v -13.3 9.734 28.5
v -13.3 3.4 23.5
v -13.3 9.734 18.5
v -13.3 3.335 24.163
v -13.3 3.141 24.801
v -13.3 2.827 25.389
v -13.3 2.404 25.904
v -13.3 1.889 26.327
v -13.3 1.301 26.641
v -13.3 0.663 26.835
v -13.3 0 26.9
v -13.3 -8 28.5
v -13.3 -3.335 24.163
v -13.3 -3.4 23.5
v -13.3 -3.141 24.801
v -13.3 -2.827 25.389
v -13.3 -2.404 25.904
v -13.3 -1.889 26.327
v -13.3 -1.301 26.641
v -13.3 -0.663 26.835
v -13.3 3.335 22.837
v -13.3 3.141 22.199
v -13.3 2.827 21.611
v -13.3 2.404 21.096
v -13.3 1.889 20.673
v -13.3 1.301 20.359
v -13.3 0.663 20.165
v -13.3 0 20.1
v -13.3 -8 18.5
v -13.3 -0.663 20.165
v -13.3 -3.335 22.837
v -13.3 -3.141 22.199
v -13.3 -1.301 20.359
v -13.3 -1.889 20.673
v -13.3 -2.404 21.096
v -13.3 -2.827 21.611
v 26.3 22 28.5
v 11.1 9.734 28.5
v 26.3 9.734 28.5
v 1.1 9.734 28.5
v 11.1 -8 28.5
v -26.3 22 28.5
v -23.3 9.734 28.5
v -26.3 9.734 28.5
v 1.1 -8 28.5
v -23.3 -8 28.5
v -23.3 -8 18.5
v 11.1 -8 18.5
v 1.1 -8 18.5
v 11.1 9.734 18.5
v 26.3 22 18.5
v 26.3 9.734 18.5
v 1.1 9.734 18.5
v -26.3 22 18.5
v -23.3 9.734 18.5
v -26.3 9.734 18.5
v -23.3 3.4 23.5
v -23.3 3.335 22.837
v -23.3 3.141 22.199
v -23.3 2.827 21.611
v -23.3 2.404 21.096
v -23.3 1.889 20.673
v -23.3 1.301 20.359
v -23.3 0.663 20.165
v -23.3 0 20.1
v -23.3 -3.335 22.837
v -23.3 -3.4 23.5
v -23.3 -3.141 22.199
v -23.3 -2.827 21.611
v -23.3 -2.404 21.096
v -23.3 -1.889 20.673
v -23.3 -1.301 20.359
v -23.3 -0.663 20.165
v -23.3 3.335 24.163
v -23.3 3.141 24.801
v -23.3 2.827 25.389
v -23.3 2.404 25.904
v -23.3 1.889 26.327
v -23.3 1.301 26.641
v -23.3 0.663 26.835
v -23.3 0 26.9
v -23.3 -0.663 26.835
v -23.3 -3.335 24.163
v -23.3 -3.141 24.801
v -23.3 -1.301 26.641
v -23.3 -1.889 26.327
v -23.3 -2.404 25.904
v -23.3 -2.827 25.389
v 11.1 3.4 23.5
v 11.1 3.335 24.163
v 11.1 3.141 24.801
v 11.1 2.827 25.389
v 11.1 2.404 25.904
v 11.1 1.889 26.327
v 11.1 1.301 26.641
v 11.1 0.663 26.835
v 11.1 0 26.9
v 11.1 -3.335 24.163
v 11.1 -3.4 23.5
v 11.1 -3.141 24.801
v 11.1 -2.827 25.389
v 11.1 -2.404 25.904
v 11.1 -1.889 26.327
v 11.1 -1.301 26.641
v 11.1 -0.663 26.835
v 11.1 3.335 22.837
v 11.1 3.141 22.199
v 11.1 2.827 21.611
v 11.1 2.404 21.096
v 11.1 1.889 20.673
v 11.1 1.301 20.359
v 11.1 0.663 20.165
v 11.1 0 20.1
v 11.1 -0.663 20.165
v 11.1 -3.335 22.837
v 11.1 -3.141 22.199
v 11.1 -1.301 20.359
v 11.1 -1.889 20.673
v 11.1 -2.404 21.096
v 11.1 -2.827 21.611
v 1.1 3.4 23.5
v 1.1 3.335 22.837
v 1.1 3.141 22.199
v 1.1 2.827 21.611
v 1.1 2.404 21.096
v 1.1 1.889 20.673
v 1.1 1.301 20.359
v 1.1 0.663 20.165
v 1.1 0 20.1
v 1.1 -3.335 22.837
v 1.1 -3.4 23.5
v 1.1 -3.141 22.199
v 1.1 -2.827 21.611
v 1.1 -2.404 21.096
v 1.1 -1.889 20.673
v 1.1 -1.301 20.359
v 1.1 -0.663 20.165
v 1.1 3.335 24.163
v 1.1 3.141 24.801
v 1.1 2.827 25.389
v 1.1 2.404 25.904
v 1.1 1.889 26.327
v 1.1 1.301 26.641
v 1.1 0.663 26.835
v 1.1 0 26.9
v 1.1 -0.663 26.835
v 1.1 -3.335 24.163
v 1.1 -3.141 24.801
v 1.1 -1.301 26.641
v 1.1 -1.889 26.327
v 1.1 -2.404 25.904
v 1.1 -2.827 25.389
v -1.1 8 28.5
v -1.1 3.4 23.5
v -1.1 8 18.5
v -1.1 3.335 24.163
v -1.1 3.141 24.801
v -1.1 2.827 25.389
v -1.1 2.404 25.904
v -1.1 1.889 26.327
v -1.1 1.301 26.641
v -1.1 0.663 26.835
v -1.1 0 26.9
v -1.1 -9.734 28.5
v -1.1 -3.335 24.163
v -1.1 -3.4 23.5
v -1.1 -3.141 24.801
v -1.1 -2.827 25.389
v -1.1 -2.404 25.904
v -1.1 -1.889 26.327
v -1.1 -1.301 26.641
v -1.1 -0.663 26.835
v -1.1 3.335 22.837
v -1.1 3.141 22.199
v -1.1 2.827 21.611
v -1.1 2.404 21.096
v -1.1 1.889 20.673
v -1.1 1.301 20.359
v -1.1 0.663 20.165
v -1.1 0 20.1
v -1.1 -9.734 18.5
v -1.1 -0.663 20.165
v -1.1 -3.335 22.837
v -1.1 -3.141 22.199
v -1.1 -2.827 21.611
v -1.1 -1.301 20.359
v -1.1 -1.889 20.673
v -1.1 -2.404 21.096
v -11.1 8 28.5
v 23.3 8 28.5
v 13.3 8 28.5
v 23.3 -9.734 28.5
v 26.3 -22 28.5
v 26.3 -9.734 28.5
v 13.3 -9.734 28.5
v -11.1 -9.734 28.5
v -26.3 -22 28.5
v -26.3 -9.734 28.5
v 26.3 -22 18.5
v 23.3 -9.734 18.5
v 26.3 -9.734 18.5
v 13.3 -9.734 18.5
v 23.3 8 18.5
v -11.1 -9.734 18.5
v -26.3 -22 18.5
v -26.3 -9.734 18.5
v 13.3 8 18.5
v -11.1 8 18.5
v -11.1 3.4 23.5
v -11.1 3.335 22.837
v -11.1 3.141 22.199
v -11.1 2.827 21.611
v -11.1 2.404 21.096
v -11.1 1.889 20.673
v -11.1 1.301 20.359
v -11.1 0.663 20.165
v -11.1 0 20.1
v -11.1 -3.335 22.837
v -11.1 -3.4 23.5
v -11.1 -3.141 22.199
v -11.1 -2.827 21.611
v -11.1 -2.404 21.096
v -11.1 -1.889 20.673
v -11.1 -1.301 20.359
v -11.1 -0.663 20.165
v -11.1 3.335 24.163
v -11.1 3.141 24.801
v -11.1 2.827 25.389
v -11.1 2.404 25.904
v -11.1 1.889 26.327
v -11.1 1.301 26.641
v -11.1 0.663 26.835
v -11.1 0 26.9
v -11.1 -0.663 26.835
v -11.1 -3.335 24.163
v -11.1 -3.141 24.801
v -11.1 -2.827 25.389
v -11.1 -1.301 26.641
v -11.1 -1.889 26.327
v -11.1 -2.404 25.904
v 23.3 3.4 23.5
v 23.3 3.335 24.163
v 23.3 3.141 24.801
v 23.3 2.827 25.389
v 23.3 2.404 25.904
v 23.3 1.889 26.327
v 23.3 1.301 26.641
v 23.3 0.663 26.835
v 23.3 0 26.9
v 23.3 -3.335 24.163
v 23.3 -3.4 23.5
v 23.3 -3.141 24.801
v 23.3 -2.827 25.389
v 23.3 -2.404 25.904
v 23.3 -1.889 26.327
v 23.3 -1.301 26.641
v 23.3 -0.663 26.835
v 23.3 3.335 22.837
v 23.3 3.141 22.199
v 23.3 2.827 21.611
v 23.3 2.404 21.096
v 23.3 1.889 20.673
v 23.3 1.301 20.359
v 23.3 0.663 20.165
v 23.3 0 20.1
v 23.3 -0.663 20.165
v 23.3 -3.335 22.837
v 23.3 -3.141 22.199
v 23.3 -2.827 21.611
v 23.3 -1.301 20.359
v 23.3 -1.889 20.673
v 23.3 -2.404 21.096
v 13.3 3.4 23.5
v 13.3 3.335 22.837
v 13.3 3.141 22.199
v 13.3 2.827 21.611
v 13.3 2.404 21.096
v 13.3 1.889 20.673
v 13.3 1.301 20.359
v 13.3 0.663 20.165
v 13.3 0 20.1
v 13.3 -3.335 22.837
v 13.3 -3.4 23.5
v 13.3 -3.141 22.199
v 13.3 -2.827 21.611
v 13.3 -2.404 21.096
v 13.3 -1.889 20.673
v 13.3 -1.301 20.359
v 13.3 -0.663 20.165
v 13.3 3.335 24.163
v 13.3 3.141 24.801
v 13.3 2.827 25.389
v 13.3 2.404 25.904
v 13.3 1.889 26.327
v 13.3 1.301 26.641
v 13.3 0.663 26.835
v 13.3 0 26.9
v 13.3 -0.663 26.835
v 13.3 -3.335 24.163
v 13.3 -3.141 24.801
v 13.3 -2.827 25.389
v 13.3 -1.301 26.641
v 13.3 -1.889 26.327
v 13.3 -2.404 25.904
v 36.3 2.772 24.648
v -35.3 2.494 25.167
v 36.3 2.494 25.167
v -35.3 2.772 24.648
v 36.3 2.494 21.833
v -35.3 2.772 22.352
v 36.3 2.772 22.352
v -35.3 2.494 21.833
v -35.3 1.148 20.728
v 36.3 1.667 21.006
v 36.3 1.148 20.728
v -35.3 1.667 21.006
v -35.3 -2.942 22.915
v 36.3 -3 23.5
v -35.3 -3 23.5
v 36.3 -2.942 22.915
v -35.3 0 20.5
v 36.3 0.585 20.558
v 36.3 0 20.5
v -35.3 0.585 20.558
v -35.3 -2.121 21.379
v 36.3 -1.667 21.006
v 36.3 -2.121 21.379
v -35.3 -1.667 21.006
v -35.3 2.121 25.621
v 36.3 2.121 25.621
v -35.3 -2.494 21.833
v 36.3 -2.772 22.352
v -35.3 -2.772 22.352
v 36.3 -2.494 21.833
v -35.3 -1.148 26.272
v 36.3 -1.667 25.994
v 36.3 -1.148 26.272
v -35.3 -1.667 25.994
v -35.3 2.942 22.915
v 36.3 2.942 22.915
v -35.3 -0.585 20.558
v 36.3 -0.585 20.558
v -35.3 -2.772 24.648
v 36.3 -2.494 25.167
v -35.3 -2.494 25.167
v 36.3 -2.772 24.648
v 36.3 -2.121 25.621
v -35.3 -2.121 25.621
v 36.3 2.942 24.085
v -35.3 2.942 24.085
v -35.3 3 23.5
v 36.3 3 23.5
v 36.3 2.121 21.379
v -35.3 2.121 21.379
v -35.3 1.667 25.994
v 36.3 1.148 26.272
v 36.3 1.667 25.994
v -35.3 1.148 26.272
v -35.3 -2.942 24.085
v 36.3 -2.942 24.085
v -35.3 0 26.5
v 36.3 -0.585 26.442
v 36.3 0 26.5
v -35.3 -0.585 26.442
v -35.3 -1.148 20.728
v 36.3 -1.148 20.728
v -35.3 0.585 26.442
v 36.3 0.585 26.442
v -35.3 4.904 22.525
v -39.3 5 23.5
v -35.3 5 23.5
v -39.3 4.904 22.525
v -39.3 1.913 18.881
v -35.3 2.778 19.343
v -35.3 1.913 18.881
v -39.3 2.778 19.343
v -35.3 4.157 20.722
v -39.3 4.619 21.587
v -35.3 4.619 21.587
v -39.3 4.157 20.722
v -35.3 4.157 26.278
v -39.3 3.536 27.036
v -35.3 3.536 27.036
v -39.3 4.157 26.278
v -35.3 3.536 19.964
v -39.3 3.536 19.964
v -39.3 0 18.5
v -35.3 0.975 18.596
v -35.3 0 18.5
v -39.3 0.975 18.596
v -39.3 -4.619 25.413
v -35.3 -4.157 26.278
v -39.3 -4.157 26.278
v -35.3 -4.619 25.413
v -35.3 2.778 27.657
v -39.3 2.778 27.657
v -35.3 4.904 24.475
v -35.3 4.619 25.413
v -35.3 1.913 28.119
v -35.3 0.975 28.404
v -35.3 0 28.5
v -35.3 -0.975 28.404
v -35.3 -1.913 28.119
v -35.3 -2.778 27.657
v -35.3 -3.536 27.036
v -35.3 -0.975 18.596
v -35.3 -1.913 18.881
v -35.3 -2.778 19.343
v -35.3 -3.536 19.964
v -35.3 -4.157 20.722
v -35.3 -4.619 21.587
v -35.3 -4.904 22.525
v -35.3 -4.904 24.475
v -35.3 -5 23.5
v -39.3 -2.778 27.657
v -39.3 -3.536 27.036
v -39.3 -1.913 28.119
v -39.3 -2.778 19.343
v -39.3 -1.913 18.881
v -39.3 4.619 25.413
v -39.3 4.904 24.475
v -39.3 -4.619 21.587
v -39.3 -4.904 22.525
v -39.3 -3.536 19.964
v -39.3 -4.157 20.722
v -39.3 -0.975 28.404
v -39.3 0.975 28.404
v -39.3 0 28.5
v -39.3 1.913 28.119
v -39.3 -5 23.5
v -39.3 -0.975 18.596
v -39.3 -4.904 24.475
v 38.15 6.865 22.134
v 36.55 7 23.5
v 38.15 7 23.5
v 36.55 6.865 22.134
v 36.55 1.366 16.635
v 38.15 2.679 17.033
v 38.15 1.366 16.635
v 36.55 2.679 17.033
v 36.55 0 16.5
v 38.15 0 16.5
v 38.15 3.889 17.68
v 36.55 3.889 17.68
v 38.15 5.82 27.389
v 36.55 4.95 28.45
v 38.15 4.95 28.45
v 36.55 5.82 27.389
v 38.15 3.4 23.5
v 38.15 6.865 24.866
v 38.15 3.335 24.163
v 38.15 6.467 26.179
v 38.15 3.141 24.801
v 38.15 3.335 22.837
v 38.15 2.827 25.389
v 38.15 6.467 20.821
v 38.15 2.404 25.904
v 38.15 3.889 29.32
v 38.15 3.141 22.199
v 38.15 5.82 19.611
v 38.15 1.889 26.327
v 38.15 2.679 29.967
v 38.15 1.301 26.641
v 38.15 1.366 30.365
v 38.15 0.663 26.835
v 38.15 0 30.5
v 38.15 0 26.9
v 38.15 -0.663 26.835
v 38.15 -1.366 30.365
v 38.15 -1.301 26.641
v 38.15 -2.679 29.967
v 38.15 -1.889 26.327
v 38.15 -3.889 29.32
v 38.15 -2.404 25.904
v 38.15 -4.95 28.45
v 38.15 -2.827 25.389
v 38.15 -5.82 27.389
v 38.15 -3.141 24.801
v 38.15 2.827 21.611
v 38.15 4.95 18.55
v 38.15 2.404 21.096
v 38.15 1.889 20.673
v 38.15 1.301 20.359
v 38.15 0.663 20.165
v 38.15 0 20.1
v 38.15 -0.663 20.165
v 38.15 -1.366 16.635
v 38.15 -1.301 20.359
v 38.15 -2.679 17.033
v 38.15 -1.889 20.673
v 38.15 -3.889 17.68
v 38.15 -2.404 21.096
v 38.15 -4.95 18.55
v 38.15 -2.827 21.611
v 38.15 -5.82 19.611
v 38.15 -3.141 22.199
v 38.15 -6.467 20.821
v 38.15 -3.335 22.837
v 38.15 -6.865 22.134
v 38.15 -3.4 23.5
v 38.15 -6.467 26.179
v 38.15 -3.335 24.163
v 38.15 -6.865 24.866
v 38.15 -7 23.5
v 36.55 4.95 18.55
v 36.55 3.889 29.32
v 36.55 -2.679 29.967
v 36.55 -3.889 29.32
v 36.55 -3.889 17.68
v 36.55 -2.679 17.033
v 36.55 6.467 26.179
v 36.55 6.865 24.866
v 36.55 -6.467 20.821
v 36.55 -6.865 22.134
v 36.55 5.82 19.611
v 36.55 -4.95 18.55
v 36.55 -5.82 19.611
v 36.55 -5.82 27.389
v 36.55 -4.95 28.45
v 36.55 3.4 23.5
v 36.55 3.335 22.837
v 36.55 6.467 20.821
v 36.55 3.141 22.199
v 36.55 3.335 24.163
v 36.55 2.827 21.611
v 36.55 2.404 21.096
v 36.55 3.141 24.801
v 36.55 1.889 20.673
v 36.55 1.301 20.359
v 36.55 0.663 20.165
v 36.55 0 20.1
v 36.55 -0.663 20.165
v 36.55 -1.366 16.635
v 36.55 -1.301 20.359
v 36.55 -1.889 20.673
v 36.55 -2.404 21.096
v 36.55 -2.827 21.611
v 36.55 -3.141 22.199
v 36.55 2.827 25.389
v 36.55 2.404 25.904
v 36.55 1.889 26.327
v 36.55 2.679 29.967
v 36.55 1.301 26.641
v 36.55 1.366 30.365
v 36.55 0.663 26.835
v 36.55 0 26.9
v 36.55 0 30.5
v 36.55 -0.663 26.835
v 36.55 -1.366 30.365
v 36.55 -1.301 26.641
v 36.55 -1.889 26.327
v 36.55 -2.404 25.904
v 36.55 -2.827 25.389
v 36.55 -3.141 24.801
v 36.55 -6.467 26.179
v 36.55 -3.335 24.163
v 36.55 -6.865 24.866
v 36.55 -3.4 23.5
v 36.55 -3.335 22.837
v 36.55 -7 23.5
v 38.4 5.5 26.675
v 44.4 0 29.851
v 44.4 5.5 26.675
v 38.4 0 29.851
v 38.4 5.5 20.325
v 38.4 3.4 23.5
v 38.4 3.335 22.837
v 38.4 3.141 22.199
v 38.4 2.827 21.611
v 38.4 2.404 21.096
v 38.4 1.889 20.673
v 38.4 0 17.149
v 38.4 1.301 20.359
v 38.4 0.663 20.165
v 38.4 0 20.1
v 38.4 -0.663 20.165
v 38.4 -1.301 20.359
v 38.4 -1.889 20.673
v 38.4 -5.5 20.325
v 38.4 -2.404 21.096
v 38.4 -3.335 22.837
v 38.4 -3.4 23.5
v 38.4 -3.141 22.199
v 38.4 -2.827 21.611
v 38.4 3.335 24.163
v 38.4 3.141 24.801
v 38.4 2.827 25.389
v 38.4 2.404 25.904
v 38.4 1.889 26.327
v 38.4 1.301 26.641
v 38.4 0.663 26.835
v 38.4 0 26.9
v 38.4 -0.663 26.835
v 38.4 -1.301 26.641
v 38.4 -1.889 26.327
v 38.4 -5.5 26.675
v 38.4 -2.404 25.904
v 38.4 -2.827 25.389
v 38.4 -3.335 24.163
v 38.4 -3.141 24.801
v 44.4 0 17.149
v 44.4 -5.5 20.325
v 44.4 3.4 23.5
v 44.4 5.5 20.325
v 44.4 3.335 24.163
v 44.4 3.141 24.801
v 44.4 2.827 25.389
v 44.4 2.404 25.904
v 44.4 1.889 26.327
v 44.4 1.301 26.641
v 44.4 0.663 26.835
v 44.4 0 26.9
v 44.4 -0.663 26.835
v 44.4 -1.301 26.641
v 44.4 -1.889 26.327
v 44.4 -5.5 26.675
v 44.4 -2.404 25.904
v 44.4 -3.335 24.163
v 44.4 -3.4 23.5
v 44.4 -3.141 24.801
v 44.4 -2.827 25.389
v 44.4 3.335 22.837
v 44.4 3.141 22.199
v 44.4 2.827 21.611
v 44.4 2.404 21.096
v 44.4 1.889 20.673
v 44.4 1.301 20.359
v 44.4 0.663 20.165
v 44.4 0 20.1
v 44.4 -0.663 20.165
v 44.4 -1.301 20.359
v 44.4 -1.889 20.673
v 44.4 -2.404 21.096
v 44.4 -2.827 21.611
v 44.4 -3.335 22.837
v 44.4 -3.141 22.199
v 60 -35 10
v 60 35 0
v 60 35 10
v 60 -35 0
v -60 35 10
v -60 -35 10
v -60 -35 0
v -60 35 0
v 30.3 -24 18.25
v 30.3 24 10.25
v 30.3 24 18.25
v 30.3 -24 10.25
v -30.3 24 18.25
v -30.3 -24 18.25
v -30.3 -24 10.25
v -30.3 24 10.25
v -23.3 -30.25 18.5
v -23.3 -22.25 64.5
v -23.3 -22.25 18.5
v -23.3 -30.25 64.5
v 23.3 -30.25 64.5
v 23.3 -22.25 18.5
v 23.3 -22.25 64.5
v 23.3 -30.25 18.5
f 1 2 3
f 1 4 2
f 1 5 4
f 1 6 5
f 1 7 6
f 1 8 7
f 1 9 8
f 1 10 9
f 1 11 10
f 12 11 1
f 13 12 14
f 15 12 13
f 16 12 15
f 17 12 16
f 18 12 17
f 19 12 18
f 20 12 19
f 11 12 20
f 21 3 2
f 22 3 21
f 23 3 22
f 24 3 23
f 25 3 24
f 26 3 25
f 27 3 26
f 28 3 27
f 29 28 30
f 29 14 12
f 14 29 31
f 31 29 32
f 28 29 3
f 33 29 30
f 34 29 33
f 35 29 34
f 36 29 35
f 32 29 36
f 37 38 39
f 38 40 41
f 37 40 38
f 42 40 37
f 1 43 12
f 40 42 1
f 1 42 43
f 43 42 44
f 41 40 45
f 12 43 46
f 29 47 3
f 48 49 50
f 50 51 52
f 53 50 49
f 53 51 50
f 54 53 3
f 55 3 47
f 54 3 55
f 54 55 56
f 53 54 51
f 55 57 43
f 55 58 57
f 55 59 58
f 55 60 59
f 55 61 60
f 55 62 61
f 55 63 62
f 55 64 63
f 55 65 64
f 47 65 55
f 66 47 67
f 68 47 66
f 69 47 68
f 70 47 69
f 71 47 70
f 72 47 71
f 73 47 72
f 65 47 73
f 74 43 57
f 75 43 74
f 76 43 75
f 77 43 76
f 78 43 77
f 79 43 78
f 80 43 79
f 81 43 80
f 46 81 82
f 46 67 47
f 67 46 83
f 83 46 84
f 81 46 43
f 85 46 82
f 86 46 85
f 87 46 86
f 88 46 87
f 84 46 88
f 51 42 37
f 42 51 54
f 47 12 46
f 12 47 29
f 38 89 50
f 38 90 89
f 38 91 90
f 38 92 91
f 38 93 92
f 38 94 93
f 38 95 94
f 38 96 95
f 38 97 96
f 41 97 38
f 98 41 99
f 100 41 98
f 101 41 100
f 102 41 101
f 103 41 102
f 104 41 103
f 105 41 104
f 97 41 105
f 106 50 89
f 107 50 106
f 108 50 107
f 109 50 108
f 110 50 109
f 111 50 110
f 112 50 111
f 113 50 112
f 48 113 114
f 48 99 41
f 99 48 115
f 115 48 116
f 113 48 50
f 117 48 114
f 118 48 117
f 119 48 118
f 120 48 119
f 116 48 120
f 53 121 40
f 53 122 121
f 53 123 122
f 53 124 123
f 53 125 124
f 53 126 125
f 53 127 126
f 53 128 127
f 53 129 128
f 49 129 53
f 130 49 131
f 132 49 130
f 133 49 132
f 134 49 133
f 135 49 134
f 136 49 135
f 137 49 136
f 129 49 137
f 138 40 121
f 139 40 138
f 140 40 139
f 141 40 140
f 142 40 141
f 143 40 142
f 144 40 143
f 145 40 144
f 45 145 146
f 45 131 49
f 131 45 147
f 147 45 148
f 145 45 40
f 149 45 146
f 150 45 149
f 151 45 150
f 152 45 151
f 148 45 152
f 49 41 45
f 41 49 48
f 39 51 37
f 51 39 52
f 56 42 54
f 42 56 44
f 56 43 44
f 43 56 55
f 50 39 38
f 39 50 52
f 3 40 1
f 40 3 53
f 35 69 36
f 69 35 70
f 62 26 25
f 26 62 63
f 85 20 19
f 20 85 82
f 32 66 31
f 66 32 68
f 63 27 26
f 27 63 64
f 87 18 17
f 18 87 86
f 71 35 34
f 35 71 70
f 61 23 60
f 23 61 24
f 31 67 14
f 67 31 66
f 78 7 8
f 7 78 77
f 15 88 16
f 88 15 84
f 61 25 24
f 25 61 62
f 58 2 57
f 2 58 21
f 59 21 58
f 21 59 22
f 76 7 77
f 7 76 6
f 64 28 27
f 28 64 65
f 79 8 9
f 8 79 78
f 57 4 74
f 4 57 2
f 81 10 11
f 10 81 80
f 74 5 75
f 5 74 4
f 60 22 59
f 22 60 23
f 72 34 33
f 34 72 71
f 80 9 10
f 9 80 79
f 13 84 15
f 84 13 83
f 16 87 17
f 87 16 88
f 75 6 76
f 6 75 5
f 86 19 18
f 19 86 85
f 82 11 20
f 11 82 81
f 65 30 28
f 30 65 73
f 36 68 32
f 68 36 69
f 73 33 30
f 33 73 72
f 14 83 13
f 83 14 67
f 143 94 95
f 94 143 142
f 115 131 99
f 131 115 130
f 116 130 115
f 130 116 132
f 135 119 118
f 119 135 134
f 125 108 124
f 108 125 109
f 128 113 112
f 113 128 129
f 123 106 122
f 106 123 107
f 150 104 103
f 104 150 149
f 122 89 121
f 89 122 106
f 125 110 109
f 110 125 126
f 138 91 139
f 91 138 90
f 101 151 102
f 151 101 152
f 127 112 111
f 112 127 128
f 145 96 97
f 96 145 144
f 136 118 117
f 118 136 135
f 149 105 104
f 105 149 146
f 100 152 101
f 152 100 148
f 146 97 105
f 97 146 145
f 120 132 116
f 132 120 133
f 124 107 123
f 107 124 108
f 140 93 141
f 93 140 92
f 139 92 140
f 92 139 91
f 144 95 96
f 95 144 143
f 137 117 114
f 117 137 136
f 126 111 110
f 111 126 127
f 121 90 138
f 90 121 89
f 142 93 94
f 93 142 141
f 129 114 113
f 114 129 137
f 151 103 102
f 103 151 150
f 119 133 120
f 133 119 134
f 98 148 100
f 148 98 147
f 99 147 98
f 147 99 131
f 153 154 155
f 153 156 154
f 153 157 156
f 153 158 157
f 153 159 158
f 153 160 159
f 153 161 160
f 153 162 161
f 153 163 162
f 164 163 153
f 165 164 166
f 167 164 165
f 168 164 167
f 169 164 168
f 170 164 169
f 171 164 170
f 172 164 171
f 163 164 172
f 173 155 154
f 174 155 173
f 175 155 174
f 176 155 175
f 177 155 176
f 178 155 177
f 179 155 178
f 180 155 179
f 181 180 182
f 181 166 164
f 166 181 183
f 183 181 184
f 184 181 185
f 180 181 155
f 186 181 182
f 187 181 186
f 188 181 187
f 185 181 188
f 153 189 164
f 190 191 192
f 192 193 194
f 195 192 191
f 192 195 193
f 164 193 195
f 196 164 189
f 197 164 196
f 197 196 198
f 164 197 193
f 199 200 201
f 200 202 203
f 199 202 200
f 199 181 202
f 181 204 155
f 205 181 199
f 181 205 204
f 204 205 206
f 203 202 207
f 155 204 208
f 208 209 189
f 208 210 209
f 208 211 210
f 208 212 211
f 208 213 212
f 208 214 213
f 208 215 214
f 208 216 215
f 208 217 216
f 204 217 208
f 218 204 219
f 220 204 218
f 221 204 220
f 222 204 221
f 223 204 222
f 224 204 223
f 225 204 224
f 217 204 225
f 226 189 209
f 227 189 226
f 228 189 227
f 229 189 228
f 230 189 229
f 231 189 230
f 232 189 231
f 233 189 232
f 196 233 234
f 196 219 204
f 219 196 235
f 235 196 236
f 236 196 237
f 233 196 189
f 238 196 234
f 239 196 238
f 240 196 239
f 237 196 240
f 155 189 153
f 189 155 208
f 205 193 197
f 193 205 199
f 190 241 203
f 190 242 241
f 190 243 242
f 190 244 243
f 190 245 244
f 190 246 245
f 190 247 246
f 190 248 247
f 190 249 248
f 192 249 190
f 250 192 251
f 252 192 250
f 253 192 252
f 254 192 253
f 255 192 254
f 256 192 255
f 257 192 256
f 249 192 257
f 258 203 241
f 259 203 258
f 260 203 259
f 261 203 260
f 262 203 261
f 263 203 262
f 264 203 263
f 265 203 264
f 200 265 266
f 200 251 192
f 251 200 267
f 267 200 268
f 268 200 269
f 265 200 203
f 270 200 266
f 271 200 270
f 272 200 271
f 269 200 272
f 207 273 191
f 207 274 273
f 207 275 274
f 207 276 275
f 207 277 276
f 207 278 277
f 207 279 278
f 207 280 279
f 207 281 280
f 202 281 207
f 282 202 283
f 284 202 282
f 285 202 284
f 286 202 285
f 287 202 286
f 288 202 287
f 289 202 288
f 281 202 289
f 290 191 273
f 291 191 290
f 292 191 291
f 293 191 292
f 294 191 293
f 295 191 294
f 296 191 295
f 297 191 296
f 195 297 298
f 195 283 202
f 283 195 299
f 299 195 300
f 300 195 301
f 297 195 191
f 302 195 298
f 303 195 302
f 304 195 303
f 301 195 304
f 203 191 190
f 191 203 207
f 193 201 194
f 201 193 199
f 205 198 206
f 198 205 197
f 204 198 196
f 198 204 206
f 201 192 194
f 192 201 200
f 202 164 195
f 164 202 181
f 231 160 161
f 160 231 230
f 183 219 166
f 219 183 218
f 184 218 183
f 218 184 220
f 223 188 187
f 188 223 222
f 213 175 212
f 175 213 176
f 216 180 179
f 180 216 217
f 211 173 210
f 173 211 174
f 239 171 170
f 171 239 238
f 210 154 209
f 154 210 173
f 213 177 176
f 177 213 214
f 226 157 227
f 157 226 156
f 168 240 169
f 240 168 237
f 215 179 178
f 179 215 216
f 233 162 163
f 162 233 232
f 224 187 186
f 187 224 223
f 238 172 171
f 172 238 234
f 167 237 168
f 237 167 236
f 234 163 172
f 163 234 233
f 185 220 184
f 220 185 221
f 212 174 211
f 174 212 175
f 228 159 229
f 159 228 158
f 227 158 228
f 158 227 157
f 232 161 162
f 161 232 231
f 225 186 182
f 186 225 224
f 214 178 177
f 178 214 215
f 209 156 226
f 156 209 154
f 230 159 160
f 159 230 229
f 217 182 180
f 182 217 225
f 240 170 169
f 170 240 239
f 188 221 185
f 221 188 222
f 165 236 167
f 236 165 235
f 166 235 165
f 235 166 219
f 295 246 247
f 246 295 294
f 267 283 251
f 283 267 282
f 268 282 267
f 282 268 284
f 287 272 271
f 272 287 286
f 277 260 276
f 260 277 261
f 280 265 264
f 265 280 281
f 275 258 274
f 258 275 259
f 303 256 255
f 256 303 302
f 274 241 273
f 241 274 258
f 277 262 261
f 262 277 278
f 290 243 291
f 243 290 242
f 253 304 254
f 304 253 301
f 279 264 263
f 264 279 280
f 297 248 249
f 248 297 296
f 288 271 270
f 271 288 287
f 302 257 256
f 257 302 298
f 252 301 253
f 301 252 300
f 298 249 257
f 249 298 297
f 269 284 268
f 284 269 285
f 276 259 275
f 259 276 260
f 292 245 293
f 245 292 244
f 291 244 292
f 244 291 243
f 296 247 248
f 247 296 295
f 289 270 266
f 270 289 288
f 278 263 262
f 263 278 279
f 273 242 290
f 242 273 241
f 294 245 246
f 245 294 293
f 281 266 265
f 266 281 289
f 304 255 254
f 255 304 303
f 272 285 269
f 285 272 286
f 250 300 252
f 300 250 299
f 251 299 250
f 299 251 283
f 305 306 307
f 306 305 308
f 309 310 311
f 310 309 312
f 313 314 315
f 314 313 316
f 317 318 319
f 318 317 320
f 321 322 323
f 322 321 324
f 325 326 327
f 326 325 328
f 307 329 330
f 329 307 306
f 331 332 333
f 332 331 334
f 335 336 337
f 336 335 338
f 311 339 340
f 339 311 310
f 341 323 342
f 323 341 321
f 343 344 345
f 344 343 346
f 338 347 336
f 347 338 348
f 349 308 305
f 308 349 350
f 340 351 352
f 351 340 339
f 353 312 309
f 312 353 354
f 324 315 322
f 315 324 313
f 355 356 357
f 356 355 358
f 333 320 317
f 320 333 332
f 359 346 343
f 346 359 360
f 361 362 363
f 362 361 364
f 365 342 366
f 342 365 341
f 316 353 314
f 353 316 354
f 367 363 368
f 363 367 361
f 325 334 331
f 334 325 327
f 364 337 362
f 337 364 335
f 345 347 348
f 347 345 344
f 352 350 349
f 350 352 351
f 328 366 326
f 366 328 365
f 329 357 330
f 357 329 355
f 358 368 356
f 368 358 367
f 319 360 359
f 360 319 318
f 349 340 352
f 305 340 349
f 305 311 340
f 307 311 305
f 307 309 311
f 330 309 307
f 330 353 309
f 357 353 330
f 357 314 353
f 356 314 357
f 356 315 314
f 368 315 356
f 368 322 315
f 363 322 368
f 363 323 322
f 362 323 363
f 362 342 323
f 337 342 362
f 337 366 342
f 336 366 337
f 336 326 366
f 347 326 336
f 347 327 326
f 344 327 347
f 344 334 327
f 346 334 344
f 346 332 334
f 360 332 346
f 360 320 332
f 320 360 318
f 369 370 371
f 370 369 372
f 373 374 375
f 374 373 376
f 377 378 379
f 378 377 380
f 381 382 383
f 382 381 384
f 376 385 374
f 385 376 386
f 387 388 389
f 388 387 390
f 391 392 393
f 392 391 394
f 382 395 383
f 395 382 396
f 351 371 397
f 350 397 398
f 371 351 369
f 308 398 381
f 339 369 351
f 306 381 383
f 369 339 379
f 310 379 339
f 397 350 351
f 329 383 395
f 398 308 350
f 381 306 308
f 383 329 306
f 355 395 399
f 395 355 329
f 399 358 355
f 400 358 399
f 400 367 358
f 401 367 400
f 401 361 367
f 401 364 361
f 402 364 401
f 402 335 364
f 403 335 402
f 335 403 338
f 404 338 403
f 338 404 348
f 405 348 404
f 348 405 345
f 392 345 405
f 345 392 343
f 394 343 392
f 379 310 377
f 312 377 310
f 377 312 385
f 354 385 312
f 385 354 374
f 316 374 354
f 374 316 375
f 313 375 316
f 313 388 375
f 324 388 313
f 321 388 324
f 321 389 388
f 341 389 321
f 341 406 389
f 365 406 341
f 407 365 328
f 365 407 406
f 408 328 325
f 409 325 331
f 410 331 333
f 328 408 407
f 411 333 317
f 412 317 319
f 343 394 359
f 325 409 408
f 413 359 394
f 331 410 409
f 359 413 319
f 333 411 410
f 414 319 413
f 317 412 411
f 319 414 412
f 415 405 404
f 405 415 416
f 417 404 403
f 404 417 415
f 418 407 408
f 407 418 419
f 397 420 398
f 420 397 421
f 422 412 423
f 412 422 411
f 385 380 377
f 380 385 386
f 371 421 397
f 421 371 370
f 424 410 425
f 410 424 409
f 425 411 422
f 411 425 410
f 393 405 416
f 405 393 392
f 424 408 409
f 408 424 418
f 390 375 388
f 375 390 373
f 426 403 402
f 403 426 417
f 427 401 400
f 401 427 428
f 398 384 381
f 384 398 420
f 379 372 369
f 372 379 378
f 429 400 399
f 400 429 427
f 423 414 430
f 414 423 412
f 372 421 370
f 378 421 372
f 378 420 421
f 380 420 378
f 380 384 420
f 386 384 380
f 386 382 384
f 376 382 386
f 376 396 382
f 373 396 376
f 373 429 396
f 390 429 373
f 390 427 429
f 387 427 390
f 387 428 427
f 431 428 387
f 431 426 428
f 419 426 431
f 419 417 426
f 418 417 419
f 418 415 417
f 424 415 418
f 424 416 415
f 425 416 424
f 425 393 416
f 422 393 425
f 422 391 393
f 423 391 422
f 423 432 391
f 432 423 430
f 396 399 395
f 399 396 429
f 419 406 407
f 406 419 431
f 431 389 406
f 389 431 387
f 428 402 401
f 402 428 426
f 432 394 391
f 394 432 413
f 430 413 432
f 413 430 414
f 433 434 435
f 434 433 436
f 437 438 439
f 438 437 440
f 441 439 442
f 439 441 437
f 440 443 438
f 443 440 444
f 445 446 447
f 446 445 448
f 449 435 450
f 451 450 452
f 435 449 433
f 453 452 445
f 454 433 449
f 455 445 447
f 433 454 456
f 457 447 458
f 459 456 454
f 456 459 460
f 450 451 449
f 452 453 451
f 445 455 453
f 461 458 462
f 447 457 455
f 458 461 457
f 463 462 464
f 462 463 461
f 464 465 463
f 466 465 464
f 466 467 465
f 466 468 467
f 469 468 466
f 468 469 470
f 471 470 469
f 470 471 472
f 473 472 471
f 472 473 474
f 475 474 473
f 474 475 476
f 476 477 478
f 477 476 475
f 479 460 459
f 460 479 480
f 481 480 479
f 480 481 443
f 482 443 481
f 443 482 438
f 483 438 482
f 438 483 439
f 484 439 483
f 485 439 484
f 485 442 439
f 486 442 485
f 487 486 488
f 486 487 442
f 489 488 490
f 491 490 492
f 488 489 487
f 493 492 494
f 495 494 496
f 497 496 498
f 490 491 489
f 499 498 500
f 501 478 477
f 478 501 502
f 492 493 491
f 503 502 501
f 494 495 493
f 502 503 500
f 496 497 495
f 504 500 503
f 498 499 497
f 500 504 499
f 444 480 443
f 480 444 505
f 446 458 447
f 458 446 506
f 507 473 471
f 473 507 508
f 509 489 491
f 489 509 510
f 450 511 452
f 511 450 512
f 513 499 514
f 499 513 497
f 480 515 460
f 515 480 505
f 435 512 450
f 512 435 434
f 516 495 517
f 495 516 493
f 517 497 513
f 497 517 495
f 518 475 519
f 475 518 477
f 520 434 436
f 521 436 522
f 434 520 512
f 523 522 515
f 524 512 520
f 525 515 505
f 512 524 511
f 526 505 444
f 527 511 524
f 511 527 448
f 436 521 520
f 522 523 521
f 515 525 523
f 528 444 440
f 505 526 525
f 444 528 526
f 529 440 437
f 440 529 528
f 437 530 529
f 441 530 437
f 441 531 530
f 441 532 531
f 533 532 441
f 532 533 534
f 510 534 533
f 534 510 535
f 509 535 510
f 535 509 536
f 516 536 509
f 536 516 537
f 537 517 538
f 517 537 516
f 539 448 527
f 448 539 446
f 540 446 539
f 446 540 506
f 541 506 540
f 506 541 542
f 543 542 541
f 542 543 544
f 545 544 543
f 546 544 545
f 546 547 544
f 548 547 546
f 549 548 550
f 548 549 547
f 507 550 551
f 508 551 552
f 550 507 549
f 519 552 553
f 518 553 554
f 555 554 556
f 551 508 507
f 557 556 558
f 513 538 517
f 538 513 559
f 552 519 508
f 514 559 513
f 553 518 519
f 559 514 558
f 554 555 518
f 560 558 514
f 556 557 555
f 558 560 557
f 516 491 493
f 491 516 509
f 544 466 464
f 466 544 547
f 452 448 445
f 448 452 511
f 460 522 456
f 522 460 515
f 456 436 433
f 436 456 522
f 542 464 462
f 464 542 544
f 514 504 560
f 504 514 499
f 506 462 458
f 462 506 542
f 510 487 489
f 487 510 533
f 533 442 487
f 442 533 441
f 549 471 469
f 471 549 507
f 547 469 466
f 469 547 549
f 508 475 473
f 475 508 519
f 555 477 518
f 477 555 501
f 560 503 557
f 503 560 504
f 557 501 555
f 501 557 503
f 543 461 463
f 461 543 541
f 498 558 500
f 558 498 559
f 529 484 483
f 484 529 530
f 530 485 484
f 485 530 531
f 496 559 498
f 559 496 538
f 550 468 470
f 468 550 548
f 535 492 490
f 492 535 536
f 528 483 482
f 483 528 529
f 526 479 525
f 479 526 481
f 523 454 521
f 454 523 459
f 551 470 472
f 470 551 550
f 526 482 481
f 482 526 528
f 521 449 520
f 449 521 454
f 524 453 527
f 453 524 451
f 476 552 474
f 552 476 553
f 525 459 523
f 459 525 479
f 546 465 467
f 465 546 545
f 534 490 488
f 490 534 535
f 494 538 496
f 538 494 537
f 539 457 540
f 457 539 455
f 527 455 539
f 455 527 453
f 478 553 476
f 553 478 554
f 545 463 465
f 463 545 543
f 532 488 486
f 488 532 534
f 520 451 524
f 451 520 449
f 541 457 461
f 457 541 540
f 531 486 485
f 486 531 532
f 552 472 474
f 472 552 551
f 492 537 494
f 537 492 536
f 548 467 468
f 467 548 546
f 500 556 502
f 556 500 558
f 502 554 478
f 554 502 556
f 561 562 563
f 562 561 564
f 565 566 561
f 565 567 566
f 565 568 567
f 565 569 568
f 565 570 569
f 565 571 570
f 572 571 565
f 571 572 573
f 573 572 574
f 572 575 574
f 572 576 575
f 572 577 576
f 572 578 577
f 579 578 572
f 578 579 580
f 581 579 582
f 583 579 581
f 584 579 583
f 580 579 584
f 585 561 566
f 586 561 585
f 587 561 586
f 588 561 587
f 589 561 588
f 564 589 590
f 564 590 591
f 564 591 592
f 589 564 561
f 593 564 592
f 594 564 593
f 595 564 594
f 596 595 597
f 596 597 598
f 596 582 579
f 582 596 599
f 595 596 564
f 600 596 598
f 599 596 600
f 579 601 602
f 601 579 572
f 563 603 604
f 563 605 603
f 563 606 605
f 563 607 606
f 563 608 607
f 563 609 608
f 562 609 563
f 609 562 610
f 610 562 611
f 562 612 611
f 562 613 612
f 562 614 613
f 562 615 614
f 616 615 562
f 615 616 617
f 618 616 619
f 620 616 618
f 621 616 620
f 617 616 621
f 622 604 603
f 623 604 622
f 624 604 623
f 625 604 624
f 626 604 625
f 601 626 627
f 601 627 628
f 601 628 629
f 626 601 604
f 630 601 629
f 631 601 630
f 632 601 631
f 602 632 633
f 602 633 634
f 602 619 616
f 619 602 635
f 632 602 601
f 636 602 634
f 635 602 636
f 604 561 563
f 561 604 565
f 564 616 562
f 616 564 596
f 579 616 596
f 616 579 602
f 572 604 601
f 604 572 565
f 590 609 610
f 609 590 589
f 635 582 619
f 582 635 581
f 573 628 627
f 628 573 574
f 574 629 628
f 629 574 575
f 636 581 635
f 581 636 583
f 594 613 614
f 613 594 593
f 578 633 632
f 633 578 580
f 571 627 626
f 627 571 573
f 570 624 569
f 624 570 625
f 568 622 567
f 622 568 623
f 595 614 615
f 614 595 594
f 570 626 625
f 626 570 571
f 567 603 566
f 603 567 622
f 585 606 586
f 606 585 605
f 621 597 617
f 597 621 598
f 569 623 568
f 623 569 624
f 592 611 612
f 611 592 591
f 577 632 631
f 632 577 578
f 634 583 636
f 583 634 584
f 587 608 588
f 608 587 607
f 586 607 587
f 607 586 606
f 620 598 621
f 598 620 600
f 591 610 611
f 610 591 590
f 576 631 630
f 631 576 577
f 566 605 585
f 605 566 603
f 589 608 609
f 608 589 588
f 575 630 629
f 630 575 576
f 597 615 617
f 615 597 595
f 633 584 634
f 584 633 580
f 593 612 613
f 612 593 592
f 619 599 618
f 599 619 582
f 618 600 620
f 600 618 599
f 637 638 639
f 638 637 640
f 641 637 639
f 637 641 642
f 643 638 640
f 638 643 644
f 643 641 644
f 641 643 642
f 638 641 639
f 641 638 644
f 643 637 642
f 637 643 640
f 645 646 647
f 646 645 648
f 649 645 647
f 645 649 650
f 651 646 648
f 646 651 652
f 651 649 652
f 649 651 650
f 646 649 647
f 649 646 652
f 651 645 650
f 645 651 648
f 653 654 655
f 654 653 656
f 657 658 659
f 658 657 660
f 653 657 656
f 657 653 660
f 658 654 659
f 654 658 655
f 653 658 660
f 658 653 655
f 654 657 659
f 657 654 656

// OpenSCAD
$fn = 32;

// ------------------------------------------------------------------------
// Comb hinge with flap: leaf 52.6 x 22 mm, pin d6, flap 46 mm
// Every part is its own module, assembly() places every instance.
// ------------------------------------------------------------------------

// --- part 1 ---
module hinge_bed() {
  difference() {
    translate([-60, -35, 0]) cube([120, 70, 10]);
  }
}

// --- part 2 ---
module hinge_riser() {
  difference() {
    translate([-30.3, -24, 0]) cube([60.6, 48, 8]);
  }
}

// --- part 3 ---
module hinge_leaf_a() {
  difference() {
    union() {
      translate([-23.3, -8, -5]) cube([10, 30, 10]);
      translate([1.1, -8, -5]) cube([10, 30, 10]);
      translate([-26.3, 9.734, -5]) cube([52.6, 12.266, 10]);
    }
    translate([-18.3, 0, 0]) rotate([0, 90, 0]) cylinder(h = 12, d = 6.8, center = true);
    translate([6.1, 0, 0]) rotate([0, 90, 0]) cylinder(h = 12, d = 6.8, center = true);
  }
}

// --- part 4 ---
module hinge_leaf_b() {
  difference() {
    union() {
      translate([-11.1, -22, -5]) cube([10, 30, 10]);
      translate([13.3, -22, -5]) cube([10, 30, 10]);
      translate([-26.3, -22, -5]) cube([52.6, 12.266, 10]);
    }
    translate([-6.1, 0, 0]) rotate([0, 90, 0]) cylinder(h = 12, d = 6.8, center = true);
    translate([18.3, 0, 0]) rotate([0, 90, 0]) cylinder(h = 12, d = 6.8, center = true);
  }
}

// --- part 5 ---
module hinge_flap() {
  difference() {
    translate([-23.3, -23, 0]) cube([46.6, 46, 8]);
  }
}

// --- part 6 ---
module hinge_pin() {
  rotate([0, 90, 0]) cylinder(h = 72.6, d = 6, center = true);
  translate([-39.3, 0, 0]) rotate([0, 90, 0]) cylinder(h = 4, d = 10);
}

// --- part 7 ---
module pin_washer() {
  difference() {
      translate([0, 0, 0]) cylinder(h = 1.6, d = 14);
      translate([0, 0, -1]) cylinder(h = 3.6, d = 6.8);
    }
}

// --- part 8 ---
module pin_nut() {
  difference() {
    linear_extrude(height = 6) polygon(points = [[6.351, 0], [3.175, 5.5], [-3.175, 5.5], [-6.351, 0], [-3.175, -5.5], [3.175, -5.5]]);
    translate([0, 0, -1]) cylinder(h = 8, d = 6.8);
  }
}

// --- assembly ---
module assembly() {
  color([0.80, 0.24, 0.20]) translate([0, 0, 0]) rotate([0, 0, 0]) hinge_bed();
  color([0.20, 0.45, 0.75]) translate([0, 0, 10.25]) rotate([0, 0, 0]) hinge_riser();
  color([0.25, 0.62, 0.32]) translate([0, 0, 23.5]) rotate([0, 0, 0]) hinge_leaf_a();
  color([0.92, 0.70, 0.18]) translate([0, 0, 23.5]) rotate([0, 0, 0]) hinge_leaf_b();
  color([0.58, 0.35, 0.70]) translate([0, -22.25, 41.5]) rotate([90, 0, 0]) hinge_flap();
  color([0.16, 0.66, 0.66]) translate([0, 0, 23.5]) rotate([0, 0, 0]) hinge_pin();
  color([0.85, 0.48, 0.18]) translate([36.55, 0, 23.5]) rotate([0, 90, 0]) pin_washer();
  color([0.55, 0.60, 0.65]) translate([38.4, 0, 23.5]) rotate([0, 90, 0]) pin_nut();
}

assembly();
